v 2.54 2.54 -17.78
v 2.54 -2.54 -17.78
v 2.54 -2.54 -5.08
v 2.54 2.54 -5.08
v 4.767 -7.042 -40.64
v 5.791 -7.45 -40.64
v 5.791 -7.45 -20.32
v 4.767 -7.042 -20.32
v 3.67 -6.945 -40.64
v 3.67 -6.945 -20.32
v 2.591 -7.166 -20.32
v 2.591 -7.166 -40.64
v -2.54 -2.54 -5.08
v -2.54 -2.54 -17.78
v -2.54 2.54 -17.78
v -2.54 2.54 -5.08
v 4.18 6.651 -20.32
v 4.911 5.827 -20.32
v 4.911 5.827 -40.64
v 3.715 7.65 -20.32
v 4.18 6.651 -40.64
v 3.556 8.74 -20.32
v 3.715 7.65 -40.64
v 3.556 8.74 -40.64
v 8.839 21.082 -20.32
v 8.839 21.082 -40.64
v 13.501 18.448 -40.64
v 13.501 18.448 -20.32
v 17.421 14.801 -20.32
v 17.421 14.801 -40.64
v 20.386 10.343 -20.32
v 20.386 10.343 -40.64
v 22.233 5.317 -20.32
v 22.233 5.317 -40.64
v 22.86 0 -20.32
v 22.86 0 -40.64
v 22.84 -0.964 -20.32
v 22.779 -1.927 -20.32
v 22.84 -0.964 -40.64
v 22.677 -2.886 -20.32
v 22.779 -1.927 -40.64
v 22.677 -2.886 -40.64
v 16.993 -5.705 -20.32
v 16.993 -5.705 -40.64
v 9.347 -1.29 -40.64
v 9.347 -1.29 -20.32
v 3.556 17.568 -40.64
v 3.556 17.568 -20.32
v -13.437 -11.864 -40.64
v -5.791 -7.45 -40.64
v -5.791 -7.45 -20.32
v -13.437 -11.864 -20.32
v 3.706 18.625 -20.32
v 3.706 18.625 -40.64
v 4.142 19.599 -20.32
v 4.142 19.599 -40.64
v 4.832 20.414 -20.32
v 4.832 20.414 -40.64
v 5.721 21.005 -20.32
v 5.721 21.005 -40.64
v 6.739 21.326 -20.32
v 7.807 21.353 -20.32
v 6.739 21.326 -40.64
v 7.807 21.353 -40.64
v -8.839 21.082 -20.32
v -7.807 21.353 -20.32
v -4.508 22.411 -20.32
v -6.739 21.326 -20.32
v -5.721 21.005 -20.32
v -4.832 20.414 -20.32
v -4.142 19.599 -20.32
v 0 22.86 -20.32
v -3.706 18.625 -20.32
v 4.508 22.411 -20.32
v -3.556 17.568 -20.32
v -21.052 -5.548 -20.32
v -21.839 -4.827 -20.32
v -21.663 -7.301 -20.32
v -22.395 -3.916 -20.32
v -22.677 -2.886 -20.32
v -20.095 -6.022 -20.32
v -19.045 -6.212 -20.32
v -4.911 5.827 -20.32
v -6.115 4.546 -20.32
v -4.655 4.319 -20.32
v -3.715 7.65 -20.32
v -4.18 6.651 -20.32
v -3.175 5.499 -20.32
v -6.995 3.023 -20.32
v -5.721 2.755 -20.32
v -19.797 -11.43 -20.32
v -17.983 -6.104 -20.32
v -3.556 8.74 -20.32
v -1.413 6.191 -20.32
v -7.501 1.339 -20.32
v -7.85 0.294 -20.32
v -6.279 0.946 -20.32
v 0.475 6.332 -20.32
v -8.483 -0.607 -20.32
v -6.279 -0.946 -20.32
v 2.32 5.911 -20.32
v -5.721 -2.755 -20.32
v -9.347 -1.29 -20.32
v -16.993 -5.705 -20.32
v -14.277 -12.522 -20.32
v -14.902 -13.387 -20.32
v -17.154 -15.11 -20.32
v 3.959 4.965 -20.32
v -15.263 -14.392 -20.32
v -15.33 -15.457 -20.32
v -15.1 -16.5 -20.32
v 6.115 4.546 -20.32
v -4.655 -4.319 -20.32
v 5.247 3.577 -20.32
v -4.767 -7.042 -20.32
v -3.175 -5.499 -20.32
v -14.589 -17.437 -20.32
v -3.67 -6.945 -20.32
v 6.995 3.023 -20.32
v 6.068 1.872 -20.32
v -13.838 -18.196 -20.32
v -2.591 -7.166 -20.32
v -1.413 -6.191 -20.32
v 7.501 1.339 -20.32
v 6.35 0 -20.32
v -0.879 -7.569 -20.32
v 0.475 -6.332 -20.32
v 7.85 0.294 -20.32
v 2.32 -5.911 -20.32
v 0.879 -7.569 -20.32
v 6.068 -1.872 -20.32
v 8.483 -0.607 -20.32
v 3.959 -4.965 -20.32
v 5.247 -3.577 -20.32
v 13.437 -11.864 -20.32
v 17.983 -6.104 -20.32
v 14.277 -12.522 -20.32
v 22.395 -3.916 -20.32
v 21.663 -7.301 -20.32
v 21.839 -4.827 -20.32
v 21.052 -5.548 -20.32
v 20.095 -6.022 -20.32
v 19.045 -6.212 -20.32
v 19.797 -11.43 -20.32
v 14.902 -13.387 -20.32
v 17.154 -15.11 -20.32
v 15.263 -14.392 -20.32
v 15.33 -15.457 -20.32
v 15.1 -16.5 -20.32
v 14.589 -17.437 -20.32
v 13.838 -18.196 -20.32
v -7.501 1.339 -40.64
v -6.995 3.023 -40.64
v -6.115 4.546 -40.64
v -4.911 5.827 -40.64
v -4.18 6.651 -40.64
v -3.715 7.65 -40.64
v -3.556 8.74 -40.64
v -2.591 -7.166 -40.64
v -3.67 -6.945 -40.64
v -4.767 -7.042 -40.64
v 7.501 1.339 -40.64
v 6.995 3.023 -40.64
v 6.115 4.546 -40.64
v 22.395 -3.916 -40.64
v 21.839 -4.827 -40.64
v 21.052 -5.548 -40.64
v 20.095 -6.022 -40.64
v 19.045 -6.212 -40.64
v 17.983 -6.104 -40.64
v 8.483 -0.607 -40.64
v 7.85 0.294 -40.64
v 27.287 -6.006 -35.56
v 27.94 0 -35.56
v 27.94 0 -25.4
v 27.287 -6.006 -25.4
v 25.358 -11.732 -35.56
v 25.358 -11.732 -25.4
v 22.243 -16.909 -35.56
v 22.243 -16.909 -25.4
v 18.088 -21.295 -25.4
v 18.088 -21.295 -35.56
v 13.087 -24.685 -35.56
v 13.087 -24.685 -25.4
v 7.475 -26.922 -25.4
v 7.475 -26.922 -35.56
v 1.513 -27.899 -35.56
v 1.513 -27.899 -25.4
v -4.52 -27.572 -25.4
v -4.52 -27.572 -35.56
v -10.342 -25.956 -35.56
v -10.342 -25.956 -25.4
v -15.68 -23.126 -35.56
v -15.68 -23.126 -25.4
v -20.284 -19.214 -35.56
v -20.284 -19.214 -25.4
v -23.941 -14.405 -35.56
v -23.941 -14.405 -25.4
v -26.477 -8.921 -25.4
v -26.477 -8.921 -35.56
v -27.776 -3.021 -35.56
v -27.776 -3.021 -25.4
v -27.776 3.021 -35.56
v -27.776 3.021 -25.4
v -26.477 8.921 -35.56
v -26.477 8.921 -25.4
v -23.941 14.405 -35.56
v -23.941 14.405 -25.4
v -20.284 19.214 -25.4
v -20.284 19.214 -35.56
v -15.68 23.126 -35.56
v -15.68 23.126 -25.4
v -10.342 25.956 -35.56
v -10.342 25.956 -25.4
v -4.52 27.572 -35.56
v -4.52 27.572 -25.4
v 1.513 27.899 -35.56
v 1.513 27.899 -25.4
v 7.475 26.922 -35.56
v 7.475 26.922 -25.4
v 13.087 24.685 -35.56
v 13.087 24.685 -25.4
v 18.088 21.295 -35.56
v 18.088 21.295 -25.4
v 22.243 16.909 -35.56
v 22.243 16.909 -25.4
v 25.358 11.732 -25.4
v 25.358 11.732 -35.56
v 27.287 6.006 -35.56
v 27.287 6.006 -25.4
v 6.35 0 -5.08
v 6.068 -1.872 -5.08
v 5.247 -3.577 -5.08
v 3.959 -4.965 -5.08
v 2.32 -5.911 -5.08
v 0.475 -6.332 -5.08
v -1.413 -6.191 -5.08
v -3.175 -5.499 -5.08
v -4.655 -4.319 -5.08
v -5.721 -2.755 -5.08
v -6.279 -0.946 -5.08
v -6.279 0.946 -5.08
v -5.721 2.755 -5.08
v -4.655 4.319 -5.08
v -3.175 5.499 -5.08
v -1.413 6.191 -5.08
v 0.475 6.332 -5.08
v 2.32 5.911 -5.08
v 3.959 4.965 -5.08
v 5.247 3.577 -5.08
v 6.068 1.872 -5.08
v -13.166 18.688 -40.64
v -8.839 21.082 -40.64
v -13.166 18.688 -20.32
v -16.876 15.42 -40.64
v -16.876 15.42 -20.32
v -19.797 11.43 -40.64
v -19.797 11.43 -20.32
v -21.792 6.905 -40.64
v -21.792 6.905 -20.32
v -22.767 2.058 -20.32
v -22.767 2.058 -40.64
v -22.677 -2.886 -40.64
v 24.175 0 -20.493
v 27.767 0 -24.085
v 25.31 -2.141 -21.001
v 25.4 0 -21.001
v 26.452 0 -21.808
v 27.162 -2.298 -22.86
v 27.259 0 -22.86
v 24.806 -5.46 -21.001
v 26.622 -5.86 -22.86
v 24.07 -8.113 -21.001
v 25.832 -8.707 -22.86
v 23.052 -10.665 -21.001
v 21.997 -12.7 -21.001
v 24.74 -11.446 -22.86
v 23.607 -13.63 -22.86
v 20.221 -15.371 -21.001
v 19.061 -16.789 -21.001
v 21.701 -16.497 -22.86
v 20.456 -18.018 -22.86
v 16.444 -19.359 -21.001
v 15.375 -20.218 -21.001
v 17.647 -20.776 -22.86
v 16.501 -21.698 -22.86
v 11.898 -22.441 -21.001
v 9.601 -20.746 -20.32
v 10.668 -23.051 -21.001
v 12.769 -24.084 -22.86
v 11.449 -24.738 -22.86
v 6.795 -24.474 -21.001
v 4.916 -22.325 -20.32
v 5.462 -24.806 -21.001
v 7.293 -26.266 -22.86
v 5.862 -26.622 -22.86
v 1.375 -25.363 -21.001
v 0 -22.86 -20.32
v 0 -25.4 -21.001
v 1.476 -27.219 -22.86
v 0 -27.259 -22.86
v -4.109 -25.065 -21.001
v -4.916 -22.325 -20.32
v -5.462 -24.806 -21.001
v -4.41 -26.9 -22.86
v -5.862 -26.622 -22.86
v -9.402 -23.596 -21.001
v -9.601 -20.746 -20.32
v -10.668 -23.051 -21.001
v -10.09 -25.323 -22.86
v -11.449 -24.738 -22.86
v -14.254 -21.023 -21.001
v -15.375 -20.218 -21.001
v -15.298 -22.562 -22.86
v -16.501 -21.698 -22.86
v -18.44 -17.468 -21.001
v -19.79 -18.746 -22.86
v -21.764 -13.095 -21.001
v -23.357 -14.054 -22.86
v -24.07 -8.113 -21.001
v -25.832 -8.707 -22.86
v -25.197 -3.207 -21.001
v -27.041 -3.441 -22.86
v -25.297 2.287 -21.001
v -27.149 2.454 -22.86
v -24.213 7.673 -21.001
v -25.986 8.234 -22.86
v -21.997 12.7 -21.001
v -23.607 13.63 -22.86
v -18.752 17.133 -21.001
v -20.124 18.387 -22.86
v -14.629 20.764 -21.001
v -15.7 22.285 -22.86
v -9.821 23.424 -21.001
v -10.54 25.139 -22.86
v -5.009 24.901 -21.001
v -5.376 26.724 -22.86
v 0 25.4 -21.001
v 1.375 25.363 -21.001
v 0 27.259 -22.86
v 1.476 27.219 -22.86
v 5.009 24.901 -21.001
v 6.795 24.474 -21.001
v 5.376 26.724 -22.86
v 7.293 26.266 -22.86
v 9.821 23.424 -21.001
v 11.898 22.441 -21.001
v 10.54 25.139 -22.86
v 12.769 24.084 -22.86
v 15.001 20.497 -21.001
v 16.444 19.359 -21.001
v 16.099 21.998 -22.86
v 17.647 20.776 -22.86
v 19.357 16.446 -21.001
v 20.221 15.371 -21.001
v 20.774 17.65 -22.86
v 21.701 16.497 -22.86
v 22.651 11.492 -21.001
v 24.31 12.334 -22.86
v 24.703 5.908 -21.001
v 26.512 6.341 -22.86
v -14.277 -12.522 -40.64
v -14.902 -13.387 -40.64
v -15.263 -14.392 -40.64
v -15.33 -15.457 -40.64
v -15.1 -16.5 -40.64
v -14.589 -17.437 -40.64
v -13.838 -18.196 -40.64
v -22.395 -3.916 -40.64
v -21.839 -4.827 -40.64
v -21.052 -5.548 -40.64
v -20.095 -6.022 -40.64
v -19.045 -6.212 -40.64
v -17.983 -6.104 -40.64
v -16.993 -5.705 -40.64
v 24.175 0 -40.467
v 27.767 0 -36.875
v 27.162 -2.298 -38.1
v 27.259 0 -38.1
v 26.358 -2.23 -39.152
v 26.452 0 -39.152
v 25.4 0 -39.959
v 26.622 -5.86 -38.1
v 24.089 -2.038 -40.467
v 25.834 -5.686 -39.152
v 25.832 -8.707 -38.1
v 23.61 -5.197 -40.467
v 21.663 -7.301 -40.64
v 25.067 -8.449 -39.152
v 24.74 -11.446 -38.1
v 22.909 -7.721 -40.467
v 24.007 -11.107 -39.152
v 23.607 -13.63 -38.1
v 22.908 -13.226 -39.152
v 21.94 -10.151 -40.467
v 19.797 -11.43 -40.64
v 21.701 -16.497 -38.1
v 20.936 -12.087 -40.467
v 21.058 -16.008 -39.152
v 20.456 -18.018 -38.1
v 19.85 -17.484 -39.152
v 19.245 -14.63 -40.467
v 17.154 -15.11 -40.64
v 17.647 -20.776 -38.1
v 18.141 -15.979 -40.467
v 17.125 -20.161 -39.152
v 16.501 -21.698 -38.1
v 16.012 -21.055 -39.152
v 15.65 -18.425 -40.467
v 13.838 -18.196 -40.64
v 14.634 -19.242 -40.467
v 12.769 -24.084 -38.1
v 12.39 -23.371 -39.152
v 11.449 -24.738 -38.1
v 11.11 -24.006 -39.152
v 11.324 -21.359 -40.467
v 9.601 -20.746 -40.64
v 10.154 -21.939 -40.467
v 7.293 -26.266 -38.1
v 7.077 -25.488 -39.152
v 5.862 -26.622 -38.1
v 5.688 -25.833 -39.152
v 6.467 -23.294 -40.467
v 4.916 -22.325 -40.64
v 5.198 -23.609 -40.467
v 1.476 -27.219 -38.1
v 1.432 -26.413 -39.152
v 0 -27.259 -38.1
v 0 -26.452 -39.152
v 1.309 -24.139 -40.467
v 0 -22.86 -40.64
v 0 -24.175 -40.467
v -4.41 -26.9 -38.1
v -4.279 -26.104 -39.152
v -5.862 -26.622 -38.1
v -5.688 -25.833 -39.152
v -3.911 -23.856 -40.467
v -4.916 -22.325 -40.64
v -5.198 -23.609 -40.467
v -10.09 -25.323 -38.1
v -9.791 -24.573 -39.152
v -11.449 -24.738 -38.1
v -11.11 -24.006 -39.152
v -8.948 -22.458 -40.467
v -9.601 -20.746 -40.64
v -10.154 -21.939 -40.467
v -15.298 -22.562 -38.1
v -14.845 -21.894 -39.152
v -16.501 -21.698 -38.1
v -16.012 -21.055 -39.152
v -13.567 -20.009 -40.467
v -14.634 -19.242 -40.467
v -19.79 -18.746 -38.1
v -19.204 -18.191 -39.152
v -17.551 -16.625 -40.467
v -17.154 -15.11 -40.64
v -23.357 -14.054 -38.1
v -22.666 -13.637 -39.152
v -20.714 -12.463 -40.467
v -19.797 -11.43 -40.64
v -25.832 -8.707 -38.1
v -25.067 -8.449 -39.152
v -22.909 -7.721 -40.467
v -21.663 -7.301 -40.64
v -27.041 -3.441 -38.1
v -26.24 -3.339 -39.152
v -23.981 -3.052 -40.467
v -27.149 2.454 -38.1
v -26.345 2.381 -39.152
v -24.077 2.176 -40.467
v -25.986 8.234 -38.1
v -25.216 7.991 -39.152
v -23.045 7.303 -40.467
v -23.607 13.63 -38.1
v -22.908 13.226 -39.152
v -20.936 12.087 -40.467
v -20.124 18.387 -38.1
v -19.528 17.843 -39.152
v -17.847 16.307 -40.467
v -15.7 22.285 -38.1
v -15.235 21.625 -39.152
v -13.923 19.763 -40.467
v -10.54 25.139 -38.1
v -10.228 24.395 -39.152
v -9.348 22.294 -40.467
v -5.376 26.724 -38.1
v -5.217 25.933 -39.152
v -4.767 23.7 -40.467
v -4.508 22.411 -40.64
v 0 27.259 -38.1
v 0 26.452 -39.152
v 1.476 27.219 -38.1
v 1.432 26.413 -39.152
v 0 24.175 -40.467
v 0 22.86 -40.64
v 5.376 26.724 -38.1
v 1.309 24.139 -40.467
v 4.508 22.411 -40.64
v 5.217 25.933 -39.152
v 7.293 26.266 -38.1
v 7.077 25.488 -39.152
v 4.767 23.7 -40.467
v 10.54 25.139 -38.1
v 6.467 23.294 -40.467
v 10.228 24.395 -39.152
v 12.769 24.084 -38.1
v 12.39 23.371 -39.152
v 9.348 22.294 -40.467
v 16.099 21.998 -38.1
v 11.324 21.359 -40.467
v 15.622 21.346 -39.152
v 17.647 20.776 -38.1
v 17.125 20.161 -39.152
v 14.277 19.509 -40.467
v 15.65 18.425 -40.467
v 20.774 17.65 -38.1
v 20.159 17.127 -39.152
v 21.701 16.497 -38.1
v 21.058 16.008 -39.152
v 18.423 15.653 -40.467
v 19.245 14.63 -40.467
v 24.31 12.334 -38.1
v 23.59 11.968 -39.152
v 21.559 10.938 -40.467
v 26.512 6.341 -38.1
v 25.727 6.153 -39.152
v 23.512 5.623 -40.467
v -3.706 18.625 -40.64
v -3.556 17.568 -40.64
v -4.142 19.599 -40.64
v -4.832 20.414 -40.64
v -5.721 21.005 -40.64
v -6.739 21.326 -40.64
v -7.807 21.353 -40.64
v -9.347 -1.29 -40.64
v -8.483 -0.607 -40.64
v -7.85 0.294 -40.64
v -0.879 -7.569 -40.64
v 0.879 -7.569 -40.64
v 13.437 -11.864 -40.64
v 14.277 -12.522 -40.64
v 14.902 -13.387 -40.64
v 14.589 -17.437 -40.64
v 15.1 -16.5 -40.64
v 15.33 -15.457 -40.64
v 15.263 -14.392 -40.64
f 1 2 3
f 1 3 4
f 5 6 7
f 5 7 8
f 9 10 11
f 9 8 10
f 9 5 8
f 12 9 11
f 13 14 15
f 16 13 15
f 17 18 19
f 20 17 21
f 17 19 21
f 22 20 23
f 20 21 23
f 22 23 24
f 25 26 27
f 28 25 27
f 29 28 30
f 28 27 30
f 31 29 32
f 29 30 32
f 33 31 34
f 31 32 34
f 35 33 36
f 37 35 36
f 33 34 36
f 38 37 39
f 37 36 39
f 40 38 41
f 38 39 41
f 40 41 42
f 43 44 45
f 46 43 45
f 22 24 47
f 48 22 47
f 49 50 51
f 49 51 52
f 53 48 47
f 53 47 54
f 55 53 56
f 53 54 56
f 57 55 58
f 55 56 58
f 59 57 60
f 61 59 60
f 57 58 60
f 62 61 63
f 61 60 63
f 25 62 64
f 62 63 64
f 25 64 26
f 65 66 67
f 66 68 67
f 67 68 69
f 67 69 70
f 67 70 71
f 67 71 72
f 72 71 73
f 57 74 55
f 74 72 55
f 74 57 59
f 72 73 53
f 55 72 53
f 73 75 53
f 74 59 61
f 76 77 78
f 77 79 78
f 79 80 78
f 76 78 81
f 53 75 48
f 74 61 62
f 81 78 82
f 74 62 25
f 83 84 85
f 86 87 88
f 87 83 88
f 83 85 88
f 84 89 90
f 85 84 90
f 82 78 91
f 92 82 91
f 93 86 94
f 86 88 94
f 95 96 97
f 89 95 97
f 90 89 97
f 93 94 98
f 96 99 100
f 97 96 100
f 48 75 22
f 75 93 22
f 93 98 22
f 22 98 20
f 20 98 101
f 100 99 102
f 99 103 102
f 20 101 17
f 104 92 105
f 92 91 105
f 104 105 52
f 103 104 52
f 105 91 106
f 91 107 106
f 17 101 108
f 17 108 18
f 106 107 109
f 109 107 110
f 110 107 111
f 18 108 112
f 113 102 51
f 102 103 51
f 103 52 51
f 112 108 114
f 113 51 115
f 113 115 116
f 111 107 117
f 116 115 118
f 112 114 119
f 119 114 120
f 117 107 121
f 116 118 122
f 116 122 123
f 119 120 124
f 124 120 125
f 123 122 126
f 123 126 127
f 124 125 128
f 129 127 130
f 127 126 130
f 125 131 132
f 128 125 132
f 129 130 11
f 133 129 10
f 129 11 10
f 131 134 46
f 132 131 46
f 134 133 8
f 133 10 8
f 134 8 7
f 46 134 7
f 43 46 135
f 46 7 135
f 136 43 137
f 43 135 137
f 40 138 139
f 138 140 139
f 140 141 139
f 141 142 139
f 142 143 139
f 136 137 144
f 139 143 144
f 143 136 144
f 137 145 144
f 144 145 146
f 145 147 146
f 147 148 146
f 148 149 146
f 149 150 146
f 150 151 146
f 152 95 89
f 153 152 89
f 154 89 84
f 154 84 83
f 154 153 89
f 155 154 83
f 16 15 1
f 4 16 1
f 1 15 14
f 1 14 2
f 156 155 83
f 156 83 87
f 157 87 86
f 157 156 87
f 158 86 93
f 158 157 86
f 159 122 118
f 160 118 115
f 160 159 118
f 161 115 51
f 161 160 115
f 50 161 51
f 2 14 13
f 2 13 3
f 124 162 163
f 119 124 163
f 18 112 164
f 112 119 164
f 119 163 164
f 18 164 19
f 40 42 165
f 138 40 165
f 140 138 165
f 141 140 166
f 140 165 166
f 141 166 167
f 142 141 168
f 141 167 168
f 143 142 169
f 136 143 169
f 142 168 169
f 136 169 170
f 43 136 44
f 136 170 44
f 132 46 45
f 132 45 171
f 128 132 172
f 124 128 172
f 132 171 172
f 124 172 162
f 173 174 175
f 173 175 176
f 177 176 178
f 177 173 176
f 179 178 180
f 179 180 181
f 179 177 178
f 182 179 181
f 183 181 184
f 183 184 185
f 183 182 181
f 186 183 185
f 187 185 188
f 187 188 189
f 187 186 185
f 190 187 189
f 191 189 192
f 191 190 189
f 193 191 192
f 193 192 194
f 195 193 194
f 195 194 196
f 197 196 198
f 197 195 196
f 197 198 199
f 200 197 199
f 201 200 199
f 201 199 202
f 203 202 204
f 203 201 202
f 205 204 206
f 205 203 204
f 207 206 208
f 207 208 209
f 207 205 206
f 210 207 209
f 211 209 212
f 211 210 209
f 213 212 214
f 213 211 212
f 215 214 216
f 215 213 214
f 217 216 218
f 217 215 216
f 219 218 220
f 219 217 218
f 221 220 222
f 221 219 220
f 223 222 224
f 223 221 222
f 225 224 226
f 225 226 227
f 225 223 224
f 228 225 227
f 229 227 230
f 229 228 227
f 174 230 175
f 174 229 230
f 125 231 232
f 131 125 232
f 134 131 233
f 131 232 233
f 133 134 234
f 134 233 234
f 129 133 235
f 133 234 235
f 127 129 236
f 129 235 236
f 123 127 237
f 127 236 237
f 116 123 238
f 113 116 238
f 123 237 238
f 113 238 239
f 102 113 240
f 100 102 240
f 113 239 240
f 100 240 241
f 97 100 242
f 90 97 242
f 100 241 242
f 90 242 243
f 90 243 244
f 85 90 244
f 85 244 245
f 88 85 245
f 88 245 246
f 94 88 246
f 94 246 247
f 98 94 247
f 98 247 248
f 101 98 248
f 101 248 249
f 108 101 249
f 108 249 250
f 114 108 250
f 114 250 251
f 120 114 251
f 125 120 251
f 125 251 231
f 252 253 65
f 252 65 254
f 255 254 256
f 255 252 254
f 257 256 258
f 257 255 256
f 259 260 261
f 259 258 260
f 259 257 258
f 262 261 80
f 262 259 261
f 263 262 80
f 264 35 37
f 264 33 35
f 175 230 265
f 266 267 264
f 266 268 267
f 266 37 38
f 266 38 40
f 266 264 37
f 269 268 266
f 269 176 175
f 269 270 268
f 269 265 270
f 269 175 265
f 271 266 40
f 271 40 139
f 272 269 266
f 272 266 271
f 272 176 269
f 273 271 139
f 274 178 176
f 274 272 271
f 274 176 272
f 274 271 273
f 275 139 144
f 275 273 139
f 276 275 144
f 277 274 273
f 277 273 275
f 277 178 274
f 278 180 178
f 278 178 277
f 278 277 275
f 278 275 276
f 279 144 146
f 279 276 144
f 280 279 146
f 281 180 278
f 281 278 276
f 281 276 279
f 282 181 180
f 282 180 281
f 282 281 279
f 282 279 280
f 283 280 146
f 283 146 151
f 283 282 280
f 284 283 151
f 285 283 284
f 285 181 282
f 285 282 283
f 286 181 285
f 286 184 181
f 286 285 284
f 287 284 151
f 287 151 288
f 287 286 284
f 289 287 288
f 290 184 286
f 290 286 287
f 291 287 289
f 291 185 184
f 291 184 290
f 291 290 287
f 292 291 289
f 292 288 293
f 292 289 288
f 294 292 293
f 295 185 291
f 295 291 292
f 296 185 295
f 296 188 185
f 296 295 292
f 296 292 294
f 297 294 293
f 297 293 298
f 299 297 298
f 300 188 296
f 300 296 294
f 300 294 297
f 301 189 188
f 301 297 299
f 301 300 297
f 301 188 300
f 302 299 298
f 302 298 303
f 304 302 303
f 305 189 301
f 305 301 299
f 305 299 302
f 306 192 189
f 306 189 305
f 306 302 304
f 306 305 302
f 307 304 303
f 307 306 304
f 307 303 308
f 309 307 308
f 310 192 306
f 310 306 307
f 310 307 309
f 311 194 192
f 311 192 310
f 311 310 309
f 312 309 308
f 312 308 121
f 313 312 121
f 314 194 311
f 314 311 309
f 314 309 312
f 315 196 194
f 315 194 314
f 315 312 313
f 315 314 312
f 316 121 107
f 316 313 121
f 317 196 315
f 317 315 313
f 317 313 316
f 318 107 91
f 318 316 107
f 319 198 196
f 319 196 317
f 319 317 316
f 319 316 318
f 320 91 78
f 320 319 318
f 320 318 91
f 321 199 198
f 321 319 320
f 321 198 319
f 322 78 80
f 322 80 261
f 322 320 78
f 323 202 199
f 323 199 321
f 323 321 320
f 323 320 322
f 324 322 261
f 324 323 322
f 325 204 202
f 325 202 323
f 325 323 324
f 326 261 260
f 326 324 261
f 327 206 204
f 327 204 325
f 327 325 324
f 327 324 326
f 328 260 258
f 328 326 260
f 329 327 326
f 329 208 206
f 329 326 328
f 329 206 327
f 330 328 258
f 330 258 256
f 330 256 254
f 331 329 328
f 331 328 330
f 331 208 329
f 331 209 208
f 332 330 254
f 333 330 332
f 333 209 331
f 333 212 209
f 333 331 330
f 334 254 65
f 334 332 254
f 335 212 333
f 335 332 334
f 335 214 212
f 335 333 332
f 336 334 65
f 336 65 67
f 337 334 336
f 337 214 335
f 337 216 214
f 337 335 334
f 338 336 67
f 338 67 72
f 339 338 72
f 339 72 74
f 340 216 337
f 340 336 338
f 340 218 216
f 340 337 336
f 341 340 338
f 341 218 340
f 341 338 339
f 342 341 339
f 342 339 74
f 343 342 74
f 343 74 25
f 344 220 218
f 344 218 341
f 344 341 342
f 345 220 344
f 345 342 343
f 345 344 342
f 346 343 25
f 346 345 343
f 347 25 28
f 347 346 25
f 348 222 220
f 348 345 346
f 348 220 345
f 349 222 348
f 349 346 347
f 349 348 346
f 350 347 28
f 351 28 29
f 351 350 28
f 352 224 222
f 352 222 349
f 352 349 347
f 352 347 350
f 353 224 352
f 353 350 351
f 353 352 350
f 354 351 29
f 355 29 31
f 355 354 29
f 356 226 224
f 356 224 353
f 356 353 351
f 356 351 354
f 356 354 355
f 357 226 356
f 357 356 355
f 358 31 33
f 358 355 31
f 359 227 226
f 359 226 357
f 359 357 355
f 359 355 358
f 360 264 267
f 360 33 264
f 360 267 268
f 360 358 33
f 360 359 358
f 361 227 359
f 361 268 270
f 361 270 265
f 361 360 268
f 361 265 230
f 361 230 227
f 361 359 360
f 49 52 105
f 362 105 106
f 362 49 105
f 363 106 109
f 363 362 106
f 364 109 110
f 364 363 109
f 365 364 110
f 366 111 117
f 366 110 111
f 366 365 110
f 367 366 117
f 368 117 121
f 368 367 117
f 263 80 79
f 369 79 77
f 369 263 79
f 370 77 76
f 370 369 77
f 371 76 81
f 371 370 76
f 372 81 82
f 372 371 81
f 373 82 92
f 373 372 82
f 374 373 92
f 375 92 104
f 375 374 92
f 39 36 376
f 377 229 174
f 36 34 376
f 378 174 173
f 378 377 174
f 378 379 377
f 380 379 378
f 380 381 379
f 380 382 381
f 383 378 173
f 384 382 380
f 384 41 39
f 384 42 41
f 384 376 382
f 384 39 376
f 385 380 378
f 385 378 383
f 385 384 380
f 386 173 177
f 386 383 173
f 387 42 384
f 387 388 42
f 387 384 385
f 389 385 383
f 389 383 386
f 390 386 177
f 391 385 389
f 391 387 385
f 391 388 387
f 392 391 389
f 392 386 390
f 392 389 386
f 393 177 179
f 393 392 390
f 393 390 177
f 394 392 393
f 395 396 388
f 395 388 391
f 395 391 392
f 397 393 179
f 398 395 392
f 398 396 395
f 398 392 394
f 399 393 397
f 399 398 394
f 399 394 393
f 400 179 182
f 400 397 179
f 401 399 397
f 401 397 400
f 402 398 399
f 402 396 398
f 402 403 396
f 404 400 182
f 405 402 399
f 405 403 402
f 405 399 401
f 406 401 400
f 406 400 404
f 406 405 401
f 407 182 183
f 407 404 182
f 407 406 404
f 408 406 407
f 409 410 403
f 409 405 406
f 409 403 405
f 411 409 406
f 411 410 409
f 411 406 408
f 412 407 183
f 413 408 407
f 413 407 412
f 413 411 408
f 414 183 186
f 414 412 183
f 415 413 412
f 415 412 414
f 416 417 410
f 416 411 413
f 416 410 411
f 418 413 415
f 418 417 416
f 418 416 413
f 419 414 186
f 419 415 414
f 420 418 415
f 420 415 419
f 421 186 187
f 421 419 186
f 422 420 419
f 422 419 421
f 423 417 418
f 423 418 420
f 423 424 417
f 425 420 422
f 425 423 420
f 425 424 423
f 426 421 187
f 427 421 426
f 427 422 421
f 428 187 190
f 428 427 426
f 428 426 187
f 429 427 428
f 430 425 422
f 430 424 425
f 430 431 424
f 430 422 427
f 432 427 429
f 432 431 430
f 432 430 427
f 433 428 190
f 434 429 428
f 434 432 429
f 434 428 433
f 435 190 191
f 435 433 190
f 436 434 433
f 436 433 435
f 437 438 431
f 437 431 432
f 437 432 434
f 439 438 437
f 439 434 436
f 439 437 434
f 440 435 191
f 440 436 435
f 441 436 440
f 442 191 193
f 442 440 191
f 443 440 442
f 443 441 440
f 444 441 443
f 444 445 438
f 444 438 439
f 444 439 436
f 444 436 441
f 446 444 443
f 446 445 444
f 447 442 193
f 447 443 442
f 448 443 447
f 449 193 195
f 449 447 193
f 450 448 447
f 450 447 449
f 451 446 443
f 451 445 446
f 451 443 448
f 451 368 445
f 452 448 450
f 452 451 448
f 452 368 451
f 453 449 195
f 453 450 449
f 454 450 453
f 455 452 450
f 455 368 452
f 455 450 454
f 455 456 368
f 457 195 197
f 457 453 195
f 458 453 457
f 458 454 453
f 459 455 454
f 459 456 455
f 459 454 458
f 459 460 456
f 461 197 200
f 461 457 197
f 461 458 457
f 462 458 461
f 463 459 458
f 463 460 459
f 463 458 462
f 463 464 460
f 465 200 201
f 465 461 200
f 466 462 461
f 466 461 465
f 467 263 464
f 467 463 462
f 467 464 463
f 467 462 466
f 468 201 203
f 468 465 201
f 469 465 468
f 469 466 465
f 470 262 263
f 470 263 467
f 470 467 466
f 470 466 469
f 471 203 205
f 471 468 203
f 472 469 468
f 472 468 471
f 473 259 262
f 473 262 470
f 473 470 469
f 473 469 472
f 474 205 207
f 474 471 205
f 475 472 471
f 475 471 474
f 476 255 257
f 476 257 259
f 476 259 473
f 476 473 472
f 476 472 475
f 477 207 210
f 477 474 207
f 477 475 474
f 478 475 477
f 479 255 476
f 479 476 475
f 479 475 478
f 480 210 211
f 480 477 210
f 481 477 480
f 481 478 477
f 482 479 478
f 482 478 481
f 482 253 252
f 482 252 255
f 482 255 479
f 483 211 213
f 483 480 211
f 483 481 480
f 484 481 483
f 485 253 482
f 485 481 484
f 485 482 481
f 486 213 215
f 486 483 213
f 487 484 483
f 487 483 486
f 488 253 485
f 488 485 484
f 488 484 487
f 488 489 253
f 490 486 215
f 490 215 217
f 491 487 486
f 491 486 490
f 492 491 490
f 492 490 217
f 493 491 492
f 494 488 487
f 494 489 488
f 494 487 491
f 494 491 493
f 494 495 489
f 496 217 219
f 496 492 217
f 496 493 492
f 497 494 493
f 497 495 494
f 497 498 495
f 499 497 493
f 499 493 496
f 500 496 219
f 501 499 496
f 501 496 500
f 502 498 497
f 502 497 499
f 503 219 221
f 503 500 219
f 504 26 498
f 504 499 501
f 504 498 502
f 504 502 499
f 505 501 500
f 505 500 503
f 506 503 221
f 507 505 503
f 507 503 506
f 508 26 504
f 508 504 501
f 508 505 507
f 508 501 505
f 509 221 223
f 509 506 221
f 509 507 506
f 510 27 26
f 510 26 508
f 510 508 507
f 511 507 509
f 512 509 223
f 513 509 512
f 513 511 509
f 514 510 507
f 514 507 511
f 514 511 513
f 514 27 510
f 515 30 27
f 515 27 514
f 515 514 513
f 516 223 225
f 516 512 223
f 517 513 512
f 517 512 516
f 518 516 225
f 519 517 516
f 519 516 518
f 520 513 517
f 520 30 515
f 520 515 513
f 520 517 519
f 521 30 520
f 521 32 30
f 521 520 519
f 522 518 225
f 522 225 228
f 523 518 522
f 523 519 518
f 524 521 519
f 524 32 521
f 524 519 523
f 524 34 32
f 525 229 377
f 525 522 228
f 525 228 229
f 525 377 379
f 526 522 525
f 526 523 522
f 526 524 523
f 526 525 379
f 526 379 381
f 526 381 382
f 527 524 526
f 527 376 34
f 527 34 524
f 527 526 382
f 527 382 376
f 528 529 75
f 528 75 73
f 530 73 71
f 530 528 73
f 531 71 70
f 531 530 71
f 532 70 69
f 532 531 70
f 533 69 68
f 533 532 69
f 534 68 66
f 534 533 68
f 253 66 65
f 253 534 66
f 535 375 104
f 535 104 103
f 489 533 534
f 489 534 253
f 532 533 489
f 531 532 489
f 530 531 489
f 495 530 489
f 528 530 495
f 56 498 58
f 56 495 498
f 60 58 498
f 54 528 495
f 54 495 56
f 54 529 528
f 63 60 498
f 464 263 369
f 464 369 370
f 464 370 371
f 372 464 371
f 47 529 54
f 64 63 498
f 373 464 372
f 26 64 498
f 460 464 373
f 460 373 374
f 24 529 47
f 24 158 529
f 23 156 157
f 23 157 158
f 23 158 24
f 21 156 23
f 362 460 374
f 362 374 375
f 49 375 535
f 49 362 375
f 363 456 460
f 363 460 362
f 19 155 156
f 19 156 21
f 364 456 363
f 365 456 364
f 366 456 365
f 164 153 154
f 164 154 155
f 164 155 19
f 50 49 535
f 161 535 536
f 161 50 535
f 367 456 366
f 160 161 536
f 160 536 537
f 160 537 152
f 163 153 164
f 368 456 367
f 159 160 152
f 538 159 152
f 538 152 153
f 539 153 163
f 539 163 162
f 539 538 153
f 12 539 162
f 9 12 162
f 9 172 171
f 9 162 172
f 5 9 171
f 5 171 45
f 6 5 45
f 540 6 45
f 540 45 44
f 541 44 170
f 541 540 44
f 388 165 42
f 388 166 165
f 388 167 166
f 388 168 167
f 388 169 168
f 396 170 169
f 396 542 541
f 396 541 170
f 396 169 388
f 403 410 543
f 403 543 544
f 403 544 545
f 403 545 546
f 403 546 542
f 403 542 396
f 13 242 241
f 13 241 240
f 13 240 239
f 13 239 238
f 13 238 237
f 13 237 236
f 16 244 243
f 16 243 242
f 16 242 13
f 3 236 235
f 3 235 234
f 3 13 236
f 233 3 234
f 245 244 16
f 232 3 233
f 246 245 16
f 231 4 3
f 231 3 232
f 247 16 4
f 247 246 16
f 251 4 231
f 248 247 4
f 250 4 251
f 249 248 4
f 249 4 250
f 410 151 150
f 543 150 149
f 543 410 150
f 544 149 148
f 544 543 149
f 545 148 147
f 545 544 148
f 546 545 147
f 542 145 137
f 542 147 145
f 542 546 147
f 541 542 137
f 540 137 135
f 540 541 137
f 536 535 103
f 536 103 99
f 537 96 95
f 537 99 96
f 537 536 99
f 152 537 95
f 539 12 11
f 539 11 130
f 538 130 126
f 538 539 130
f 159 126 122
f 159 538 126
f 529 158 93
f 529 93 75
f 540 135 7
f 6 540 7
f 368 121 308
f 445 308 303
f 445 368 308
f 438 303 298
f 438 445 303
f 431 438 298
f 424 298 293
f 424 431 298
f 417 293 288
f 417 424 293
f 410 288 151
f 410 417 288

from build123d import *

# Parameters (mm, degrees)
SKETCH1_R           = 27.94
BOSS_EXTRUDE1_DEPTH = 20.32
SKETCH2_R           = 6.35
BOSS_EXTRUDE2_DEPTH = 20.32
BOSS_EXTRUDE3_START = 20.32
SKETCH3_R           = 27.94
BOSS_EXTRUDE3_DEPTH = 20.32
FILLET1_R           = 5.08
FILLET2_R           = 5.08
FILLET3_R           = 5.08
FILLET4_R           = 5.08
CUT_EXTRUDE1_DEPTH  = 73.645776241
SKETCH6_R           = 27.94
CUT_EXTRUDE2_DEPTH  = 57.682420605
SKETCH7_R           = 6.35
CUT_EXTRUDE3_DEPTH  = 5.08
SKETCH8_W           = 5.08
SKETCH8_H           = 5.08
CUT_EXTRUDE4_DEPTH  = 12.7


with BuildPart() as part:
    # Sketch1 → Boss-Extrude1 (new body)
    with BuildSketch(Plane.XY):
        Circle(SKETCH1_R)
    extrude(amount=BOSS_EXTRUDE1_DEPTH)

    # Sketch2 → Boss-Extrude2 (add)
    with BuildSketch(Plane(origin=(0, 0, 0), x_dir=(-1, 0, 0), z_dir=(0, 0, -1))):
        with Locations(Location((0, 0, 0), (0, 0, 180))):
            Circle(SKETCH2_R)
    extrude(amount=BOSS_EXTRUDE2_DEPTH)

    # Sketch3 → Boss-Extrude3 (add)
    with BuildSketch(Plane(origin=(0, 0, -20.32), x_dir=(-1, 0, 0), z_dir=(0, 0, -1)).offset(BOSS_EXTRUDE3_START)):
        with Locations(Location((0, 0, 0), (0, 0, 180))):
            Circle(SKETCH3_R)
    extrude(amount=-BOSS_EXTRUDE3_DEPTH)

    # Fillet1
    fillet1_edges = [part.edges().sort_by_distance(p)[0] for p in [
        (-27.94, 0, 20.32),
    ]]
    fillet(fillet1_edges, radius=FILLET1_R)

    # Fillet2
    fillet2_edges = [part.edges().sort_by_distance(p)[0] for p in [
        (-27.94, 0, 0),
    ]]
    fillet(fillet2_edges, radius=FILLET2_R)

    # Fillet3
    fillet3_edges = [part.edges().sort_by_distance(p)[0] for p in [
        (-27.94, 0, -20.32),
    ]]
    fillet(fillet3_edges, radius=FILLET3_R)

    # Fillet4
    fillet4_edges = [part.edges().sort_by_distance(p)[0] for p in [
        (-27.94, 0, -40.64),
    ]]
    fillet(fillet4_edges, radius=FILLET4_R)

    # Sketch4 → Cut-Extrude1 (cut, through all)
    with BuildSketch(Plane(origin=(0, 0, -40.64), x_dir=(-1, 0, 0), z_dir=(0, 0, -1))):
        with BuildLine():
            Line((-3.556, 8.739962471), (-3.556, 17.568282329))
            ThreePointArc((-3.556, 17.568282329), (-5.256117539, 20.740741312), (-8.8392, 21.081938795))
            ThreePointArc((-8.8392, 21.081938795), (-19.797340731, 11.43), (-22.677094558, -2.885997648))
            ThreePointArc((-22.677094558, -2.885997648), (-20.590067639, -5.818439342), (-16.992578798, -5.704554829))
            Line((-16.992578798, -5.704554829), (-9.347029528, -1.2903949))
            ThreePointArc((-9.347029528, -1.2903949), (-8.133427478, -0.179541209), (-7.501353019, 1.339441259))
            ThreePointArc((-7.501353019, 1.339441259), (-6.599113577, 3.81), (-4.910666667, 5.826641648))
            ThreePointArc((-4.910666667, 5.826641648), (-3.911226491, 7.13352542), (-3.556, 8.739962471))
        make_face()
        with BuildLine():
            Line((3.556, 8.739962471), (3.556, 17.568282329))
            ThreePointArc((3.556, 17.568282329), (5.256117539, 20.740741312), (8.8392, 21.081938795))
            ThreePointArc((8.8392, 21.081938795), (19.797340731, 11.43), (22.677094558, -2.885997648))
            ThreePointArc((22.677094558, -2.885997648), (20.590067639, -5.818439342), (16.992578798, -5.704554829))
            Line((16.992578798, -5.704554829), (9.347029528, -1.2903949))
            ThreePointArc((9.347029528, -1.2903949), (8.133427478, -0.179541209), (7.501353019, 1.339441259))
            ThreePointArc((7.501353019, 1.339441259), (6.599113577, 3.81), (4.910666667, 5.826641648))
            ThreePointArc((4.910666667, 5.826641648), (3.911226491, 7.13352542), (3.556, 8.739962471))
        make_face()
        with BuildLine():
            Line((5.791029528, -7.449567572), (13.436578798, -11.8637275))
            ThreePointArc((13.436578798, -11.8637275), (15.3339501, -14.92230197), (13.837894558, -18.195941147))
            ThreePointArc((13.837894558, -18.195941147), (0, -22.86), (-13.837894558, -18.195941147))
            ThreePointArc((-13.837894558, -18.195941147), (-15.3339501, -14.92230197), (-13.436578798, -11.8637275))
            Line((-13.436578798, -11.8637275), (-5.791029528, -7.449567572))
            ThreePointArc((-5.791029528, -7.449567572), (-4.222200987, -6.953984211), (-2.590686352, -7.166082907))
            ThreePointArc((-2.590686352, -7.166082907), (0, -7.62), (2.590686352, -7.166082907))
            ThreePointArc((2.590686352, -7.166082907), (4.222200987, -6.953984211), (5.791029528, -7.449567572))
        make_face()
    extrude(amount=-CUT_EXTRUDE1_DEPTH, mode=Mode.SUBTRACT)

    # Sketch6 → Cut-Extrude2 (cut, through all)
    with BuildSketch(Plane(origin=(0, 0, 0), x_dir=(-1, 0, 0), z_dir=(0, 0, -1))):
        Circle(SKETCH6_R)
    extrude(amount=-CUT_EXTRUDE2_DEPTH, mode=Mode.SUBTRACT)

    # Sketch7 → Cut-Extrude3 (cut)
    with BuildSketch(Plane.XY):
        Circle(SKETCH7_R)
    extrude(amount=-CUT_EXTRUDE3_DEPTH, mode=Mode.SUBTRACT)

    # Sketch8 → Cut-Extrude4 (cut)
    with BuildSketch(Plane.XY.offset(-5.08)):
        Rectangle(SKETCH8_W, SKETCH8_H)
    extrude(amount=-CUT_EXTRUDE4_DEPTH, mode=Mode.SUBTRACT)


solid = part.part
